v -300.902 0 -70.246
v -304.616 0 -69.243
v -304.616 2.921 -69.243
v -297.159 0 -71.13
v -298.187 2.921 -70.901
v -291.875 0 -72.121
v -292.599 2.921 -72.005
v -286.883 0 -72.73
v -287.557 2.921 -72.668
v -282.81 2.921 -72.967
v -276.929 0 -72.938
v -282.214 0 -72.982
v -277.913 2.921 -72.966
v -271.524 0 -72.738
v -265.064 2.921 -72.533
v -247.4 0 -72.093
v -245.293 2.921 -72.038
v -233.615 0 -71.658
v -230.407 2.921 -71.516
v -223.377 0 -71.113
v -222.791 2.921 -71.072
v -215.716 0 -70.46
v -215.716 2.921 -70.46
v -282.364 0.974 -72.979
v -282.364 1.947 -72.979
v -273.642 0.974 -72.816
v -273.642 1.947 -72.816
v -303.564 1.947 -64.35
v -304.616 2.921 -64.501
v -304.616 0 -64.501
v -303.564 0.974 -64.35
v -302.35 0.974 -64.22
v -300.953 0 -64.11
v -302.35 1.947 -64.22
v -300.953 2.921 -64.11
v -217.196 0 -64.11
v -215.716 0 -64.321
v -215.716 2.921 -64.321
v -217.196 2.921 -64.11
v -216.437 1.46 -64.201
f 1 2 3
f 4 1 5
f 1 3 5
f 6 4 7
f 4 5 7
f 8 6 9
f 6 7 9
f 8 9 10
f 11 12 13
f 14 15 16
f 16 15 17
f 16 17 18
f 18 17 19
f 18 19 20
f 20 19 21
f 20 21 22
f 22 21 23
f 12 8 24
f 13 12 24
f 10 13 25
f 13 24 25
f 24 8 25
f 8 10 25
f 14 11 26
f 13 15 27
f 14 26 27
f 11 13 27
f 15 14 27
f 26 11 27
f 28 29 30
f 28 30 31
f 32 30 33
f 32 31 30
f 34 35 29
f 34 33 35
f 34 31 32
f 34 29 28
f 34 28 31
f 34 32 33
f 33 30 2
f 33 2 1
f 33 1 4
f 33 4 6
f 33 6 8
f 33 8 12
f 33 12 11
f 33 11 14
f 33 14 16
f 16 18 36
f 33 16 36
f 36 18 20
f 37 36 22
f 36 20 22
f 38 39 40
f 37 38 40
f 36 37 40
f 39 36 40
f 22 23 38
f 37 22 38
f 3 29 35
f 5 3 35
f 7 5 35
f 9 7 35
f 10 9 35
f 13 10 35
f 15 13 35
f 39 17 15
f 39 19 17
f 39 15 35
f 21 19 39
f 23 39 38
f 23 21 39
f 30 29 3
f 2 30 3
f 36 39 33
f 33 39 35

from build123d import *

# Parameters (mm, degrees)
SKETCH1_W           = 304.8
SKETCH1_H           = 76.2
BOSS_EXTRUDE1_DEPTH = 3.175
CUT_EXTRUDE3_DEPTH  = 0.254
CUT_EXTRUDE5_DEPTH  = 0.254
SKETCH2_3_OUTSIDE_W = 369.64
SKETCH2_3_OUTSIDE_H = 141.04
CUT_EXTRUDE7_DEPTH  = 315.196691105


with BuildPart() as part:
    # Sketch1 → Boss-Extrude1 (new body)
    with BuildSketch(Plane(origin=(0, 0, 0), x_dir=(1, 0, 0), z_dir=(0, 1, 0))):
        with Locations((-152.4, 38.1)):
            Rectangle(SKETCH1_W, SKETCH1_H)
    extrude(amount=BOSS_EXTRUDE1_DEPTH)

    # Sketch2 → Cut-Extrude3 (cut)
    with BuildSketch(Plane(origin=(0, 3.175, 0), x_dir=(1, 0, 0), z_dir=(0, 1, 0))):
        with BuildLine():
            Line((-304.8, 5.132354223), (-304.8, 0.390438323))
            add(Edge.make_bspline(
                [(-304.8, 0.390438323), (-303.821243343, 0.22923291), (-302.632591032, 0.100235841), (-301.136713645, 0)],
                knots=[0.767987957, 0.767987957, 0.767987957, 0.767987957, 1, 1, 1, 1], degree=3))
            Line((-301.136713645, 0), (-217.379871236, 0))
            add(Edge.make_bspline(
                [(-215.9, 0.210253502), (-216.602591478, 0.075926224), (-217.379871236, 0)],
                knots=[0.882956558, 0.882956558, 0.882956558, 1, 1, 1], degree=2))
            Line((-215.9, 0.210253502), (-215.9, 6.35))
            add(Edge.make_bspline(
                [(-304.8, 5.132354223), (-295.056068779, 7.913424716), (-284.63514545, 9.175759011), (-256.65451685, 7.910717471), (-231.983718042, 8.039058457), (-215.9, 6.35)],
                knots=[0.033341876, 0.033341876, 0.033341876, 0.033341876, 0.196819423, 0.285044024, 0.915587883, 0.915587883, 0.915587883, 0.915587883], degree=3))
        make_face()
        with BuildLine():
            Line((-304.748193138, 14.319973849), (-304.748193138, 9.578057948))
            add(Edge.make_bspline(
                [(-304.748193138, 9.578057948), (-303.76943648, 9.416852535), (-302.58078417, 9.287855466), (-301.084906782, 9.187619625)],
                knots=[0.767987957, 0.767987957, 0.767987957, 0.767987957, 1, 1, 1, 1], degree=3))
            Line((-301.084906782, 9.187619625), (-217.328064374, 9.187619625))
            add(Edge.make_bspline(
                [(-215.848193138, 9.397873128), (-216.550784616, 9.263545849), (-217.328064374, 9.187619625)],
                knots=[0.882956558, 0.882956558, 0.882956558, 1, 1, 1], degree=2))
            Line((-215.848193138, 9.397873128), (-215.848193138, 15.537619625))
            add(Edge.make_bspline(
                [(-304.748193138, 14.319973849), (-295.004261916, 17.101044341), (-284.583338588, 18.363378636), (-256.602709988, 17.098337097), (-231.93191118, 17.226678082), (-215.848193138, 15.537619625)],
                knots=[0.033341876, 0.033341876, 0.033341876, 0.033341876, 0.196819423, 0.285044024, 0.915587883, 0.915587883, 0.915587883, 0.915587883], degree=3))
        make_face()
        with BuildLine():
            Line((-304.77561062, 23.435546339), (-304.77561062, 18.693630439))
            add(Edge.make_bspline(
                [(-304.77561062, 18.693630439), (-303.796853962, 18.532425025), (-302.608201652, 18.403427957), (-301.112324264, 18.303192116)],
                knots=[0.767987957, 0.767987957, 0.767987957, 0.767987957, 1, 1, 1, 1], degree=3))
            Line((-301.112324264, 18.303192116), (-217.355481855, 18.303192116))
            add(Edge.make_bspline(
                [(-215.87561062, 18.513445618), (-216.578202097, 18.37911834), (-217.355481855, 18.303192116)],
                knots=[0.882956558, 0.882956558, 0.882956558, 1, 1, 1], degree=2))
            Line((-215.87561062, 18.513445618), (-215.87561062, 24.653192116))
            add(Edge.make_bspline(
                [(-304.77561062, 23.435546339), (-295.031679398, 26.216616832), (-284.61075607, 27.478951126), (-256.63012747, 26.213909587), (-231.959328661, 26.342250572), (-215.87561062, 24.653192116)],
                knots=[0.033341876, 0.033341876, 0.033341876, 0.033341876, 0.196819423, 0.285044024, 0.915587883, 0.915587883, 0.915587883, 0.915587883], degree=3))
        make_face()
        with BuildLine():
            Line((-304.723803757, 32.623165964), (-304.723803757, 27.881250064))
            add(Edge.make_bspline(
                [(-304.723803757, 27.881250064), (-303.7450471, 27.720044651), (-302.55639479, 27.591047582), (-301.060517402, 27.490811741)],
                knots=[0.767987957, 0.767987957, 0.767987957, 0.767987957, 1, 1, 1, 1], degree=3))
            Line((-301.060517402, 27.490811741), (-217.303674993, 27.490811741))
            add(Edge.make_bspline(
                [(-215.823803757, 27.701065244), (-216.526395235, 27.566737965), (-217.303674993, 27.490811741)],
                knots=[0.882956558, 0.882956558, 0.882956558, 1, 1, 1], degree=2))
            Line((-215.823803757, 27.701065244), (-215.823803757, 33.840811741))
            add(Edge.make_bspline(
                [(-304.723803757, 32.623165964), (-294.979872536, 35.404236457), (-284.558949208, 36.666570752), (-256.578320608, 35.401529213), (-231.907521799, 35.529870198), (-215.823803757, 33.840811741)],
                knots=[0.033341876, 0.033341876, 0.033341876, 0.033341876, 0.196819423, 0.285044024, 0.915587883, 0.915587883, 0.915587883, 0.915587883], degree=3))
        make_face()
        with BuildLine():
            Line((-304.692120731, 41.752034592), (-304.692120731, 37.010118692))
            add(Edge.make_bspline(
                [(-304.692120731, 37.010118692), (-303.713364073, 36.848913278), (-302.524711763, 36.71991621), (-301.028834375, 36.619680369)],
                knots=[0.767987957, 0.767987957, 0.767987957, 0.767987957, 1, 1, 1, 1], degree=3))
            Line((-301.028834375, 36.619680369), (-217.271991966, 36.619680369))
            add(Edge.make_bspline(
                [(-215.792120731, 36.829933871), (-216.494712209, 36.695606593), (-217.271991966, 36.619680369)],
                knots=[0.882956558, 0.882956558, 0.882956558, 1, 1, 1], degree=2))
            Line((-215.792120731, 36.829933871), (-215.792120731, 42.969680369))
            add(Edge.make_bspline(
                [(-304.692120731, 41.752034592), (-294.948189509, 44.533105085), (-284.527266181, 45.795439379), (-256.546637581, 44.53039784), (-231.875838773, 44.658738825), (-215.792120731, 42.969680369)],
                knots=[0.033341876, 0.033341876, 0.033341876, 0.033341876, 0.196819423, 0.285044024, 0.915587883, 0.915587883, 0.915587883, 0.915587883], degree=3))
        make_face()
        with BuildLine():
            Line((-304.640313869, 50.939654217), (-304.640313869, 46.197738317))
            add(Edge.make_bspline(
                [(-304.640313869, 46.197738317), (-303.661557211, 46.036532904), (-302.472904901, 45.907535835), (-300.977027513, 45.807299994)],
                knots=[0.767987957, 0.767987957, 0.767987957, 0.767987957, 1, 1, 1, 1], degree=3))
            Line((-300.977027513, 45.807299994), (-217.220185104, 45.807299994))
            add(Edge.make_bspline(
                [(-215.740313869, 46.017553497), (-216.442905346, 45.883226218), (-217.220185104, 45.807299994)],
                knots=[0.882956558, 0.882956558, 0.882956558, 1, 1, 1], degree=2))
            Line((-215.740313869, 46.017553497), (-215.740313869, 52.157299994))
            add(Edge.make_bspline(
                [(-304.640313869, 50.939654217), (-294.896382647, 53.72072471), (-284.475459319, 54.983059005), (-256.494830719, 53.718017466), (-231.82403191, 53.846358451), (-215.740313869, 52.157299994)],
                knots=[0.033341876, 0.033341876, 0.033341876, 0.033341876, 0.196819423, 0.285044024, 0.915587883, 0.915587883, 0.915587883, 0.915587883], degree=3))
        make_face()
        with BuildLine():
            Line((-304.66773135, 60.055226708), (-304.66773135, 55.313310807))
            add(Edge.make_bspline(
                [(-304.66773135, 55.313310807), (-303.688974693, 55.152105394), (-302.500322383, 55.023108326), (-301.004444995, 54.922872485)],
                knots=[0.767987957, 0.767987957, 0.767987957, 0.767987957, 1, 1, 1, 1], degree=3))
            Line((-301.004444995, 54.922872485), (-217.247602586, 54.922872485))
            add(Edge.make_bspline(
                [(-215.76773135, 55.133125987), (-216.470322828, 54.998798708), (-217.247602586, 54.922872485)],
                knots=[0.882956558, 0.882956558, 0.882956558, 1, 1, 1], degree=2))
            Line((-215.76773135, 55.133125987), (-215.76773135, 61.272872485))
            add(Edge.make_bspline(
                [(-304.66773135, 60.055226708), (-294.923800129, 62.836297201), (-284.502876801, 64.098631495), (-256.522248201, 62.833589956), (-231.851449392, 62.961930941), (-215.76773135, 61.272872485)],
                knots=[0.033341876, 0.033341876, 0.033341876, 0.033341876, 0.196819423, 0.285044024, 0.915587883, 0.915587883, 0.915587883, 0.915587883], degree=3))
        make_face()
        with BuildLine():
            Line((-304.615924488, 69.242846333), (-304.615924488, 64.500930433))
            add(Edge.make_bspline(
                [(-304.615924488, 64.500930433), (-303.637167831, 64.33972502), (-302.448515521, 64.210727951), (-300.952638133, 64.11049211)],
                knots=[0.767987957, 0.767987957, 0.767987957, 0.767987957, 1, 1, 1, 1], degree=3))
            Line((-300.952638133, 64.11049211), (-217.195795724, 64.11049211))
            add(Edge.make_bspline(
                [(-215.715924488, 64.320745612), (-216.418515966, 64.186418334), (-217.195795724, 64.11049211)],
                knots=[0.882956558, 0.882956558, 0.882956558, 1, 1, 1], degree=2))
            Line((-215.715924488, 64.320745612), (-215.715924488, 70.46049211))
            add(Edge.make_bspline(
                [(-304.615924488, 69.242846333), (-294.871993267, 72.023916826), (-284.451069938, 73.286251121), (-256.470441339, 72.021209581), (-231.79964253, 72.149550567), (-215.715924488, 70.46049211)],
                knots=[0.033341876, 0.033341876, 0.033341876, 0.033341876, 0.196819423, 0.285044024, 0.915587883, 0.915587883, 0.915587883, 0.915587883], degree=3))
        make_face()
        with BuildLine():
            Line((-215.183865707, 5.315478387), (-215.183865707, 0.573562486))
            add(Edge.make_bspline(
                [(-215.183865707, 0.573562486), (-214.20510905, 0.412357073), (-213.01645674, 0.283360005), (-211.520579352, 0.183124164)],
                knots=[0.767987957, 0.767987957, 0.767987957, 0.767987957, 1, 1, 1, 1], degree=3))
            Line((-211.520579352, 0.183124164), (-127.763736943, 0.183124164))
            add(Edge.make_bspline(
                [(-126.283865707, 0.393377666), (-126.986457185, 0.259050387), (-127.763736943, 0.183124164)],
                knots=[0.882956558, 0.882956558, 0.882956558, 1, 1, 1], degree=2))
            Line((-126.283865707, 0.393377666), (-126.283865707, 6.533124164))
            add(Edge.make_bspline(
                [(-215.183865707, 5.315478387), (-205.439934486, 8.09654888), (-195.019011157, 9.358883174), (-167.038382558, 8.093841635), (-142.367583749, 8.22218262), (-126.283865707, 6.533124164)],
                knots=[0.033341876, 0.033341876, 0.033341876, 0.033341876, 0.196819423, 0.285044024, 0.915587883, 0.915587883, 0.915587883, 0.915587883], degree=3))
        make_face()
        with BuildLine():
            Line((-215.132058845, 14.503098012), (-215.132058845, 9.761182112))
            add(Edge.make_bspline(
                [(-215.132058845, 9.761182112), (-214.153302188, 9.599976698), (-212.964649877, 9.47097963), (-211.46877249, 9.370743789)],
                knots=[0.767987957, 0.767987957, 0.767987957, 0.767987957, 1, 1, 1, 1], degree=3))
            Line((-211.46877249, 9.370743789), (-127.711930081, 9.370743789))
            add(Edge.make_bspline(
                [(-126.232058845, 9.580997291), (-126.934650323, 9.446670013), (-127.711930081, 9.370743789)],
                knots=[0.882956558, 0.882956558, 0.882956558, 1, 1, 1], degree=2))
            Line((-126.232058845, 9.580997291), (-126.232058845, 15.720743789))
            add(Edge.make_bspline(
                [(-215.132058845, 14.503098012), (-205.388127624, 17.284168505), (-194.967204295, 18.546502799), (-166.986575695, 17.28146126), (-142.315776887, 17.409802246), (-126.232058845, 15.720743789)],
                knots=[0.033341876, 0.033341876, 0.033341876, 0.033341876, 0.196819423, 0.285044024, 0.915587883, 0.915587883, 0.915587883, 0.915587883], degree=3))
        make_face()
        with BuildLine():
            Line((-215.159476327, 23.618670503), (-215.159476327, 18.876754602))
            add(Edge.make_bspline(
                [(-215.159476327, 18.876754602), (-214.180719669, 18.715549189), (-212.992067359, 18.58655212), (-211.496189971, 18.486316279)],
                knots=[0.767987957, 0.767987957, 0.767987957, 0.767987957, 1, 1, 1, 1], degree=3))
            Line((-211.496189971, 18.486316279), (-127.739347562, 18.486316279))
            add(Edge.make_bspline(
                [(-126.259476327, 18.696569782), (-126.962067804, 18.562242503), (-127.739347562, 18.486316279)],
                knots=[0.882956558, 0.882956558, 0.882956558, 1, 1, 1], degree=2))
            Line((-126.259476327, 18.696569782), (-126.259476327, 24.836316279))
            add(Edge.make_bspline(
                [(-215.159476327, 23.618670503), (-205.415545105, 26.399740996), (-194.994621777, 27.66207529), (-167.013993177, 26.397033751), (-142.343194369, 26.525374736), (-126.259476327, 24.836316279)],
                knots=[0.033341876, 0.033341876, 0.033341876, 0.033341876, 0.196819423, 0.285044024, 0.915587883, 0.915587883, 0.915587883, 0.915587883], degree=3))
        make_face()
        with BuildLine():
            Line((-215.107669465, 32.806290128), (-215.107669465, 28.064374228))
            add(Edge.make_bspline(
                [(-215.107669465, 28.064374228), (-214.128912807, 27.903168814), (-212.940260497, 27.774171746), (-211.444383109, 27.673935905)],
                knots=[0.767987957, 0.767987957, 0.767987957, 0.767987957, 1, 1, 1, 1], degree=3))
            Line((-211.444383109, 27.673935905), (-127.6875407, 27.673935905))
            add(Edge.make_bspline(
                [(-126.207669465, 27.884189407), (-126.910260942, 27.749862129), (-127.6875407, 27.673935905)],
                knots=[0.882956558, 0.882956558, 0.882956558, 1, 1, 1], degree=2))
            Line((-126.207669465, 27.884189407), (-126.207669465, 34.023935905))
            add(Edge.make_bspline(
                [(-215.107669465, 32.806290128), (-205.363738243, 35.587360621), (-194.942814915, 36.849694915), (-166.962186315, 35.584653376), (-142.291387506, 35.712994361), (-126.207669465, 34.023935905)],
                knots=[0.033341876, 0.033341876, 0.033341876, 0.033341876, 0.196819423, 0.285044024, 0.915587883, 0.915587883, 0.915587883, 0.915587883], degree=3))
        make_face()
    extrude(amount=-CUT_EXTRUDE3_DEPTH, mode=Mode.SUBTRACT)

    # Sketch3 → Cut-Extrude5 (cut)
    with BuildSketch(Plane(origin=(0, 3.175, 0), x_dir=(1, 0, 0), z_dir=(0, 1, 0))):
        with BuildLine():
            Line((-124.773731724, 0), (-73.973731724, 0))
            Line((-73.973731724, 0), (-73.973731724, 5.715))
            add(Edge.make_bspline(
                [(-124.773731724, 5.588), (-99.390849234, 12.627627449), (-73.973731724, 5.715)],
                knots=[0, 0, 0, 1, 1, 1], degree=2))
            Line((-124.773731724, 5.588), (-124.773731724, 0))
        make_face()
        with BuildLine():
            Line((-124.666073477, 9.555243731), (-73.866073477, 9.555243731))
            Line((-73.866073477, 9.555243731), (-73.866073477, 15.270243731))
            add(Edge.make_bspline(
                [(-124.666073477, 15.143243731), (-99.282006864, 21.683704535), (-73.866073477, 15.270243731)],
                knots=[0, 0, 0, 1, 1, 1], degree=2))
            Line((-124.666073477, 15.143243731), (-124.666073477, 9.555243731))
        make_face()
        with BuildLine():
            Line((-124.604715686, 19.129476511), (-73.804715686, 19.129476511))
            Line((-73.804715686, 19.129476511), (-73.804715686, 24.844476511))
            add(Edge.make_bspline(
                [(-124.604715686, 24.717476511), (-99.220649073, 31.257937315), (-73.804715686, 24.844476511)],
                knots=[0, 0, 0, 1, 1, 1], degree=2))
            Line((-124.604715686, 24.717476511), (-124.604715686, 19.129476511))
        make_face()
        with BuildLine():
            Line((-124.495240807, 28.763265862), (-73.695240807, 28.763265862))
            Line((-73.695240807, 28.763265862), (-73.695240807, 34.478265862))
            add(Edge.make_bspline(
                [(-124.495240807, 34.351265862), (-99.111174194, 40.891726665), (-73.695240807, 34.478265862)],
                knots=[0, 0, 0, 1, 1, 1], degree=2))
            Line((-124.495240807, 34.351265862), (-124.495240807, 28.763265862))
        make_face()
        with BuildLine():
            Line((-124.385765928, 38.397055212), (-73.585765928, 38.397055212))
            Line((-73.585765928, 38.397055212), (-73.585765928, 44.112055212))
            add(Edge.make_bspline(
                [(-124.385765928, 43.985055212), (-99.001699315, 50.525516016), (-73.585765928, 44.112055212)],
                knots=[0, 0, 0, 1, 1, 1], degree=2))
            Line((-124.385765928, 43.985055212), (-124.385765928, 38.397055212))
        make_face()
        with BuildLine():
            Line((-124.166816171, 49.235068231), (-73.366816171, 49.235068231))
            Line((-73.366816171, 49.235068231), (-73.366816171, 54.950068231))
            add(Edge.make_bspline(
                [(-124.166816171, 54.823068231), (-98.782749557, 61.363529035), (-73.366816171, 54.950068231)],
                knots=[0, 0, 0, 1, 1, 1], degree=2))
            Line((-124.166816171, 54.823068231), (-124.166816171, 49.235068231))
        make_face()
        with BuildLine():
            Line((-124.138868232, 59.013713621), (-73.338868232, 59.013713621))
            Line((-73.338868232, 59.013713621), (-73.338868232, 64.728713621))
            add(Edge.make_bspline(
                [(-124.138868232, 64.601713621), (-98.754801619, 71.142174425), (-73.338868232, 64.728713621)],
                knots=[0, 0, 0, 1, 1, 1], degree=2))
            Line((-124.138868232, 64.601713621), (-124.138868232, 59.013713621))
        make_face()
        with BuildLine():
            Line((-213.669393762, 38.449060159), (-162.869393762, 38.449060159))
            Line((-162.869393762, 38.449060159), (-162.869393762, 44.164060159))
            add(Edge.make_bspline(
                [(-213.669393762, 44.037060159), (-188.285327148, 50.577520962), (-162.869393762, 44.164060159)],
                knots=[0, 0, 0, 1, 1, 1], degree=2))
            Line((-213.669393762, 44.037060159), (-213.669393762, 38.449060159))
        make_face()
        with BuildLine():
            Line((-213.513008565, 49.239638781), (-162.713008565, 49.239638781))
            Line((-162.713008565, 49.239638781), (-162.713008565, 54.954638781))
            add(Edge.make_bspline(
                [(-213.513008565, 54.827638781), (-188.128941951, 61.368099585), (-162.713008565, 54.954638781)],
                knots=[0, 0, 0, 1, 1, 1], degree=2))
            Line((-213.513008565, 54.827638781), (-213.513008565, 49.239638781))
        make_face()
        with BuildLine():
            Line((-213.20023817, 60.030217404), (-162.40023817, 60.030217404))
            Line((-162.40023817, 60.030217404), (-162.40023817, 65.745217404))
            add(Edge.make_bspline(
                [(-213.20023817, 65.618217404), (-187.816171556, 72.158678208), (-162.40023817, 65.745217404)],
                knots=[0, 0, 0, 1, 1, 1], degree=2))
            Line((-213.20023817, 65.618217404), (-213.20023817, 60.030217404))
        make_face()
        Polygon((0, 76.2), (-31.75, 76.2), (-63.5, 0), (0, 0), align=None)
    extrude(amount=-CUT_EXTRUDE5_DEPTH, mode=Mode.SUBTRACT)

    # Sketch2<3> outside → Cut-Extrude7 (cut, through all)
    with BuildSketch(Plane(origin=(0, 3.175, 0), x_dir=(1, 0, 0), z_dir=(0, 1, 0))):
        with Locations((-152.4, 38.1)):
            Rectangle(SKETCH2_3_OUTSIDE_W, SKETCH2_3_OUTSIDE_H)
        with BuildLine():
            add(Edge.make_bspline(
                [(-304.615924488, 69.242846333), (-294.871993267, 72.023916826), (-284.451069938, 73.286251121), (-256.470441339, 72.021209581), (-231.79964253, 72.149550567), (-215.715924488, 70.46049211)],
                knots=[0.033341876, 0.033341876, 0.033341876, 0.033341876, 0.196819423, 0.285044024, 0.915587883, 0.915587883, 0.915587883, 0.915587883], degree=3))
            Line((-304.615924488, 69.242846333), (-304.615924488, 64.500930433))
            add(Edge.make_bspline(
                [(-304.615924488, 64.500930433), (-303.637167831, 64.33972502), (-302.448515521, 64.210727951), (-300.952638133, 64.11049211)],
                knots=[0.767987957, 0.767987957, 0.767987957, 0.767987957, 1, 1, 1, 1], degree=3))
            Line((-300.952638133, 64.11049211), (-217.195795724, 64.11049211))
            add(Edge.make_bspline(
                [(-215.715924488, 64.320745612), (-216.418515966, 64.186418334), (-217.195795724, 64.11049211)],
                knots=[0.882956558, 0.882956558, 0.882956558, 1, 1, 1], degree=2))
            Line((-215.715924488, 64.320745612), (-215.715924488, 70.46049211))
        make_face(mode=Mode.SUBTRACT)
    extrude(amount=-CUT_EXTRUDE7_DEPTH, mode=Mode.SUBTRACT)


solid = part.part
